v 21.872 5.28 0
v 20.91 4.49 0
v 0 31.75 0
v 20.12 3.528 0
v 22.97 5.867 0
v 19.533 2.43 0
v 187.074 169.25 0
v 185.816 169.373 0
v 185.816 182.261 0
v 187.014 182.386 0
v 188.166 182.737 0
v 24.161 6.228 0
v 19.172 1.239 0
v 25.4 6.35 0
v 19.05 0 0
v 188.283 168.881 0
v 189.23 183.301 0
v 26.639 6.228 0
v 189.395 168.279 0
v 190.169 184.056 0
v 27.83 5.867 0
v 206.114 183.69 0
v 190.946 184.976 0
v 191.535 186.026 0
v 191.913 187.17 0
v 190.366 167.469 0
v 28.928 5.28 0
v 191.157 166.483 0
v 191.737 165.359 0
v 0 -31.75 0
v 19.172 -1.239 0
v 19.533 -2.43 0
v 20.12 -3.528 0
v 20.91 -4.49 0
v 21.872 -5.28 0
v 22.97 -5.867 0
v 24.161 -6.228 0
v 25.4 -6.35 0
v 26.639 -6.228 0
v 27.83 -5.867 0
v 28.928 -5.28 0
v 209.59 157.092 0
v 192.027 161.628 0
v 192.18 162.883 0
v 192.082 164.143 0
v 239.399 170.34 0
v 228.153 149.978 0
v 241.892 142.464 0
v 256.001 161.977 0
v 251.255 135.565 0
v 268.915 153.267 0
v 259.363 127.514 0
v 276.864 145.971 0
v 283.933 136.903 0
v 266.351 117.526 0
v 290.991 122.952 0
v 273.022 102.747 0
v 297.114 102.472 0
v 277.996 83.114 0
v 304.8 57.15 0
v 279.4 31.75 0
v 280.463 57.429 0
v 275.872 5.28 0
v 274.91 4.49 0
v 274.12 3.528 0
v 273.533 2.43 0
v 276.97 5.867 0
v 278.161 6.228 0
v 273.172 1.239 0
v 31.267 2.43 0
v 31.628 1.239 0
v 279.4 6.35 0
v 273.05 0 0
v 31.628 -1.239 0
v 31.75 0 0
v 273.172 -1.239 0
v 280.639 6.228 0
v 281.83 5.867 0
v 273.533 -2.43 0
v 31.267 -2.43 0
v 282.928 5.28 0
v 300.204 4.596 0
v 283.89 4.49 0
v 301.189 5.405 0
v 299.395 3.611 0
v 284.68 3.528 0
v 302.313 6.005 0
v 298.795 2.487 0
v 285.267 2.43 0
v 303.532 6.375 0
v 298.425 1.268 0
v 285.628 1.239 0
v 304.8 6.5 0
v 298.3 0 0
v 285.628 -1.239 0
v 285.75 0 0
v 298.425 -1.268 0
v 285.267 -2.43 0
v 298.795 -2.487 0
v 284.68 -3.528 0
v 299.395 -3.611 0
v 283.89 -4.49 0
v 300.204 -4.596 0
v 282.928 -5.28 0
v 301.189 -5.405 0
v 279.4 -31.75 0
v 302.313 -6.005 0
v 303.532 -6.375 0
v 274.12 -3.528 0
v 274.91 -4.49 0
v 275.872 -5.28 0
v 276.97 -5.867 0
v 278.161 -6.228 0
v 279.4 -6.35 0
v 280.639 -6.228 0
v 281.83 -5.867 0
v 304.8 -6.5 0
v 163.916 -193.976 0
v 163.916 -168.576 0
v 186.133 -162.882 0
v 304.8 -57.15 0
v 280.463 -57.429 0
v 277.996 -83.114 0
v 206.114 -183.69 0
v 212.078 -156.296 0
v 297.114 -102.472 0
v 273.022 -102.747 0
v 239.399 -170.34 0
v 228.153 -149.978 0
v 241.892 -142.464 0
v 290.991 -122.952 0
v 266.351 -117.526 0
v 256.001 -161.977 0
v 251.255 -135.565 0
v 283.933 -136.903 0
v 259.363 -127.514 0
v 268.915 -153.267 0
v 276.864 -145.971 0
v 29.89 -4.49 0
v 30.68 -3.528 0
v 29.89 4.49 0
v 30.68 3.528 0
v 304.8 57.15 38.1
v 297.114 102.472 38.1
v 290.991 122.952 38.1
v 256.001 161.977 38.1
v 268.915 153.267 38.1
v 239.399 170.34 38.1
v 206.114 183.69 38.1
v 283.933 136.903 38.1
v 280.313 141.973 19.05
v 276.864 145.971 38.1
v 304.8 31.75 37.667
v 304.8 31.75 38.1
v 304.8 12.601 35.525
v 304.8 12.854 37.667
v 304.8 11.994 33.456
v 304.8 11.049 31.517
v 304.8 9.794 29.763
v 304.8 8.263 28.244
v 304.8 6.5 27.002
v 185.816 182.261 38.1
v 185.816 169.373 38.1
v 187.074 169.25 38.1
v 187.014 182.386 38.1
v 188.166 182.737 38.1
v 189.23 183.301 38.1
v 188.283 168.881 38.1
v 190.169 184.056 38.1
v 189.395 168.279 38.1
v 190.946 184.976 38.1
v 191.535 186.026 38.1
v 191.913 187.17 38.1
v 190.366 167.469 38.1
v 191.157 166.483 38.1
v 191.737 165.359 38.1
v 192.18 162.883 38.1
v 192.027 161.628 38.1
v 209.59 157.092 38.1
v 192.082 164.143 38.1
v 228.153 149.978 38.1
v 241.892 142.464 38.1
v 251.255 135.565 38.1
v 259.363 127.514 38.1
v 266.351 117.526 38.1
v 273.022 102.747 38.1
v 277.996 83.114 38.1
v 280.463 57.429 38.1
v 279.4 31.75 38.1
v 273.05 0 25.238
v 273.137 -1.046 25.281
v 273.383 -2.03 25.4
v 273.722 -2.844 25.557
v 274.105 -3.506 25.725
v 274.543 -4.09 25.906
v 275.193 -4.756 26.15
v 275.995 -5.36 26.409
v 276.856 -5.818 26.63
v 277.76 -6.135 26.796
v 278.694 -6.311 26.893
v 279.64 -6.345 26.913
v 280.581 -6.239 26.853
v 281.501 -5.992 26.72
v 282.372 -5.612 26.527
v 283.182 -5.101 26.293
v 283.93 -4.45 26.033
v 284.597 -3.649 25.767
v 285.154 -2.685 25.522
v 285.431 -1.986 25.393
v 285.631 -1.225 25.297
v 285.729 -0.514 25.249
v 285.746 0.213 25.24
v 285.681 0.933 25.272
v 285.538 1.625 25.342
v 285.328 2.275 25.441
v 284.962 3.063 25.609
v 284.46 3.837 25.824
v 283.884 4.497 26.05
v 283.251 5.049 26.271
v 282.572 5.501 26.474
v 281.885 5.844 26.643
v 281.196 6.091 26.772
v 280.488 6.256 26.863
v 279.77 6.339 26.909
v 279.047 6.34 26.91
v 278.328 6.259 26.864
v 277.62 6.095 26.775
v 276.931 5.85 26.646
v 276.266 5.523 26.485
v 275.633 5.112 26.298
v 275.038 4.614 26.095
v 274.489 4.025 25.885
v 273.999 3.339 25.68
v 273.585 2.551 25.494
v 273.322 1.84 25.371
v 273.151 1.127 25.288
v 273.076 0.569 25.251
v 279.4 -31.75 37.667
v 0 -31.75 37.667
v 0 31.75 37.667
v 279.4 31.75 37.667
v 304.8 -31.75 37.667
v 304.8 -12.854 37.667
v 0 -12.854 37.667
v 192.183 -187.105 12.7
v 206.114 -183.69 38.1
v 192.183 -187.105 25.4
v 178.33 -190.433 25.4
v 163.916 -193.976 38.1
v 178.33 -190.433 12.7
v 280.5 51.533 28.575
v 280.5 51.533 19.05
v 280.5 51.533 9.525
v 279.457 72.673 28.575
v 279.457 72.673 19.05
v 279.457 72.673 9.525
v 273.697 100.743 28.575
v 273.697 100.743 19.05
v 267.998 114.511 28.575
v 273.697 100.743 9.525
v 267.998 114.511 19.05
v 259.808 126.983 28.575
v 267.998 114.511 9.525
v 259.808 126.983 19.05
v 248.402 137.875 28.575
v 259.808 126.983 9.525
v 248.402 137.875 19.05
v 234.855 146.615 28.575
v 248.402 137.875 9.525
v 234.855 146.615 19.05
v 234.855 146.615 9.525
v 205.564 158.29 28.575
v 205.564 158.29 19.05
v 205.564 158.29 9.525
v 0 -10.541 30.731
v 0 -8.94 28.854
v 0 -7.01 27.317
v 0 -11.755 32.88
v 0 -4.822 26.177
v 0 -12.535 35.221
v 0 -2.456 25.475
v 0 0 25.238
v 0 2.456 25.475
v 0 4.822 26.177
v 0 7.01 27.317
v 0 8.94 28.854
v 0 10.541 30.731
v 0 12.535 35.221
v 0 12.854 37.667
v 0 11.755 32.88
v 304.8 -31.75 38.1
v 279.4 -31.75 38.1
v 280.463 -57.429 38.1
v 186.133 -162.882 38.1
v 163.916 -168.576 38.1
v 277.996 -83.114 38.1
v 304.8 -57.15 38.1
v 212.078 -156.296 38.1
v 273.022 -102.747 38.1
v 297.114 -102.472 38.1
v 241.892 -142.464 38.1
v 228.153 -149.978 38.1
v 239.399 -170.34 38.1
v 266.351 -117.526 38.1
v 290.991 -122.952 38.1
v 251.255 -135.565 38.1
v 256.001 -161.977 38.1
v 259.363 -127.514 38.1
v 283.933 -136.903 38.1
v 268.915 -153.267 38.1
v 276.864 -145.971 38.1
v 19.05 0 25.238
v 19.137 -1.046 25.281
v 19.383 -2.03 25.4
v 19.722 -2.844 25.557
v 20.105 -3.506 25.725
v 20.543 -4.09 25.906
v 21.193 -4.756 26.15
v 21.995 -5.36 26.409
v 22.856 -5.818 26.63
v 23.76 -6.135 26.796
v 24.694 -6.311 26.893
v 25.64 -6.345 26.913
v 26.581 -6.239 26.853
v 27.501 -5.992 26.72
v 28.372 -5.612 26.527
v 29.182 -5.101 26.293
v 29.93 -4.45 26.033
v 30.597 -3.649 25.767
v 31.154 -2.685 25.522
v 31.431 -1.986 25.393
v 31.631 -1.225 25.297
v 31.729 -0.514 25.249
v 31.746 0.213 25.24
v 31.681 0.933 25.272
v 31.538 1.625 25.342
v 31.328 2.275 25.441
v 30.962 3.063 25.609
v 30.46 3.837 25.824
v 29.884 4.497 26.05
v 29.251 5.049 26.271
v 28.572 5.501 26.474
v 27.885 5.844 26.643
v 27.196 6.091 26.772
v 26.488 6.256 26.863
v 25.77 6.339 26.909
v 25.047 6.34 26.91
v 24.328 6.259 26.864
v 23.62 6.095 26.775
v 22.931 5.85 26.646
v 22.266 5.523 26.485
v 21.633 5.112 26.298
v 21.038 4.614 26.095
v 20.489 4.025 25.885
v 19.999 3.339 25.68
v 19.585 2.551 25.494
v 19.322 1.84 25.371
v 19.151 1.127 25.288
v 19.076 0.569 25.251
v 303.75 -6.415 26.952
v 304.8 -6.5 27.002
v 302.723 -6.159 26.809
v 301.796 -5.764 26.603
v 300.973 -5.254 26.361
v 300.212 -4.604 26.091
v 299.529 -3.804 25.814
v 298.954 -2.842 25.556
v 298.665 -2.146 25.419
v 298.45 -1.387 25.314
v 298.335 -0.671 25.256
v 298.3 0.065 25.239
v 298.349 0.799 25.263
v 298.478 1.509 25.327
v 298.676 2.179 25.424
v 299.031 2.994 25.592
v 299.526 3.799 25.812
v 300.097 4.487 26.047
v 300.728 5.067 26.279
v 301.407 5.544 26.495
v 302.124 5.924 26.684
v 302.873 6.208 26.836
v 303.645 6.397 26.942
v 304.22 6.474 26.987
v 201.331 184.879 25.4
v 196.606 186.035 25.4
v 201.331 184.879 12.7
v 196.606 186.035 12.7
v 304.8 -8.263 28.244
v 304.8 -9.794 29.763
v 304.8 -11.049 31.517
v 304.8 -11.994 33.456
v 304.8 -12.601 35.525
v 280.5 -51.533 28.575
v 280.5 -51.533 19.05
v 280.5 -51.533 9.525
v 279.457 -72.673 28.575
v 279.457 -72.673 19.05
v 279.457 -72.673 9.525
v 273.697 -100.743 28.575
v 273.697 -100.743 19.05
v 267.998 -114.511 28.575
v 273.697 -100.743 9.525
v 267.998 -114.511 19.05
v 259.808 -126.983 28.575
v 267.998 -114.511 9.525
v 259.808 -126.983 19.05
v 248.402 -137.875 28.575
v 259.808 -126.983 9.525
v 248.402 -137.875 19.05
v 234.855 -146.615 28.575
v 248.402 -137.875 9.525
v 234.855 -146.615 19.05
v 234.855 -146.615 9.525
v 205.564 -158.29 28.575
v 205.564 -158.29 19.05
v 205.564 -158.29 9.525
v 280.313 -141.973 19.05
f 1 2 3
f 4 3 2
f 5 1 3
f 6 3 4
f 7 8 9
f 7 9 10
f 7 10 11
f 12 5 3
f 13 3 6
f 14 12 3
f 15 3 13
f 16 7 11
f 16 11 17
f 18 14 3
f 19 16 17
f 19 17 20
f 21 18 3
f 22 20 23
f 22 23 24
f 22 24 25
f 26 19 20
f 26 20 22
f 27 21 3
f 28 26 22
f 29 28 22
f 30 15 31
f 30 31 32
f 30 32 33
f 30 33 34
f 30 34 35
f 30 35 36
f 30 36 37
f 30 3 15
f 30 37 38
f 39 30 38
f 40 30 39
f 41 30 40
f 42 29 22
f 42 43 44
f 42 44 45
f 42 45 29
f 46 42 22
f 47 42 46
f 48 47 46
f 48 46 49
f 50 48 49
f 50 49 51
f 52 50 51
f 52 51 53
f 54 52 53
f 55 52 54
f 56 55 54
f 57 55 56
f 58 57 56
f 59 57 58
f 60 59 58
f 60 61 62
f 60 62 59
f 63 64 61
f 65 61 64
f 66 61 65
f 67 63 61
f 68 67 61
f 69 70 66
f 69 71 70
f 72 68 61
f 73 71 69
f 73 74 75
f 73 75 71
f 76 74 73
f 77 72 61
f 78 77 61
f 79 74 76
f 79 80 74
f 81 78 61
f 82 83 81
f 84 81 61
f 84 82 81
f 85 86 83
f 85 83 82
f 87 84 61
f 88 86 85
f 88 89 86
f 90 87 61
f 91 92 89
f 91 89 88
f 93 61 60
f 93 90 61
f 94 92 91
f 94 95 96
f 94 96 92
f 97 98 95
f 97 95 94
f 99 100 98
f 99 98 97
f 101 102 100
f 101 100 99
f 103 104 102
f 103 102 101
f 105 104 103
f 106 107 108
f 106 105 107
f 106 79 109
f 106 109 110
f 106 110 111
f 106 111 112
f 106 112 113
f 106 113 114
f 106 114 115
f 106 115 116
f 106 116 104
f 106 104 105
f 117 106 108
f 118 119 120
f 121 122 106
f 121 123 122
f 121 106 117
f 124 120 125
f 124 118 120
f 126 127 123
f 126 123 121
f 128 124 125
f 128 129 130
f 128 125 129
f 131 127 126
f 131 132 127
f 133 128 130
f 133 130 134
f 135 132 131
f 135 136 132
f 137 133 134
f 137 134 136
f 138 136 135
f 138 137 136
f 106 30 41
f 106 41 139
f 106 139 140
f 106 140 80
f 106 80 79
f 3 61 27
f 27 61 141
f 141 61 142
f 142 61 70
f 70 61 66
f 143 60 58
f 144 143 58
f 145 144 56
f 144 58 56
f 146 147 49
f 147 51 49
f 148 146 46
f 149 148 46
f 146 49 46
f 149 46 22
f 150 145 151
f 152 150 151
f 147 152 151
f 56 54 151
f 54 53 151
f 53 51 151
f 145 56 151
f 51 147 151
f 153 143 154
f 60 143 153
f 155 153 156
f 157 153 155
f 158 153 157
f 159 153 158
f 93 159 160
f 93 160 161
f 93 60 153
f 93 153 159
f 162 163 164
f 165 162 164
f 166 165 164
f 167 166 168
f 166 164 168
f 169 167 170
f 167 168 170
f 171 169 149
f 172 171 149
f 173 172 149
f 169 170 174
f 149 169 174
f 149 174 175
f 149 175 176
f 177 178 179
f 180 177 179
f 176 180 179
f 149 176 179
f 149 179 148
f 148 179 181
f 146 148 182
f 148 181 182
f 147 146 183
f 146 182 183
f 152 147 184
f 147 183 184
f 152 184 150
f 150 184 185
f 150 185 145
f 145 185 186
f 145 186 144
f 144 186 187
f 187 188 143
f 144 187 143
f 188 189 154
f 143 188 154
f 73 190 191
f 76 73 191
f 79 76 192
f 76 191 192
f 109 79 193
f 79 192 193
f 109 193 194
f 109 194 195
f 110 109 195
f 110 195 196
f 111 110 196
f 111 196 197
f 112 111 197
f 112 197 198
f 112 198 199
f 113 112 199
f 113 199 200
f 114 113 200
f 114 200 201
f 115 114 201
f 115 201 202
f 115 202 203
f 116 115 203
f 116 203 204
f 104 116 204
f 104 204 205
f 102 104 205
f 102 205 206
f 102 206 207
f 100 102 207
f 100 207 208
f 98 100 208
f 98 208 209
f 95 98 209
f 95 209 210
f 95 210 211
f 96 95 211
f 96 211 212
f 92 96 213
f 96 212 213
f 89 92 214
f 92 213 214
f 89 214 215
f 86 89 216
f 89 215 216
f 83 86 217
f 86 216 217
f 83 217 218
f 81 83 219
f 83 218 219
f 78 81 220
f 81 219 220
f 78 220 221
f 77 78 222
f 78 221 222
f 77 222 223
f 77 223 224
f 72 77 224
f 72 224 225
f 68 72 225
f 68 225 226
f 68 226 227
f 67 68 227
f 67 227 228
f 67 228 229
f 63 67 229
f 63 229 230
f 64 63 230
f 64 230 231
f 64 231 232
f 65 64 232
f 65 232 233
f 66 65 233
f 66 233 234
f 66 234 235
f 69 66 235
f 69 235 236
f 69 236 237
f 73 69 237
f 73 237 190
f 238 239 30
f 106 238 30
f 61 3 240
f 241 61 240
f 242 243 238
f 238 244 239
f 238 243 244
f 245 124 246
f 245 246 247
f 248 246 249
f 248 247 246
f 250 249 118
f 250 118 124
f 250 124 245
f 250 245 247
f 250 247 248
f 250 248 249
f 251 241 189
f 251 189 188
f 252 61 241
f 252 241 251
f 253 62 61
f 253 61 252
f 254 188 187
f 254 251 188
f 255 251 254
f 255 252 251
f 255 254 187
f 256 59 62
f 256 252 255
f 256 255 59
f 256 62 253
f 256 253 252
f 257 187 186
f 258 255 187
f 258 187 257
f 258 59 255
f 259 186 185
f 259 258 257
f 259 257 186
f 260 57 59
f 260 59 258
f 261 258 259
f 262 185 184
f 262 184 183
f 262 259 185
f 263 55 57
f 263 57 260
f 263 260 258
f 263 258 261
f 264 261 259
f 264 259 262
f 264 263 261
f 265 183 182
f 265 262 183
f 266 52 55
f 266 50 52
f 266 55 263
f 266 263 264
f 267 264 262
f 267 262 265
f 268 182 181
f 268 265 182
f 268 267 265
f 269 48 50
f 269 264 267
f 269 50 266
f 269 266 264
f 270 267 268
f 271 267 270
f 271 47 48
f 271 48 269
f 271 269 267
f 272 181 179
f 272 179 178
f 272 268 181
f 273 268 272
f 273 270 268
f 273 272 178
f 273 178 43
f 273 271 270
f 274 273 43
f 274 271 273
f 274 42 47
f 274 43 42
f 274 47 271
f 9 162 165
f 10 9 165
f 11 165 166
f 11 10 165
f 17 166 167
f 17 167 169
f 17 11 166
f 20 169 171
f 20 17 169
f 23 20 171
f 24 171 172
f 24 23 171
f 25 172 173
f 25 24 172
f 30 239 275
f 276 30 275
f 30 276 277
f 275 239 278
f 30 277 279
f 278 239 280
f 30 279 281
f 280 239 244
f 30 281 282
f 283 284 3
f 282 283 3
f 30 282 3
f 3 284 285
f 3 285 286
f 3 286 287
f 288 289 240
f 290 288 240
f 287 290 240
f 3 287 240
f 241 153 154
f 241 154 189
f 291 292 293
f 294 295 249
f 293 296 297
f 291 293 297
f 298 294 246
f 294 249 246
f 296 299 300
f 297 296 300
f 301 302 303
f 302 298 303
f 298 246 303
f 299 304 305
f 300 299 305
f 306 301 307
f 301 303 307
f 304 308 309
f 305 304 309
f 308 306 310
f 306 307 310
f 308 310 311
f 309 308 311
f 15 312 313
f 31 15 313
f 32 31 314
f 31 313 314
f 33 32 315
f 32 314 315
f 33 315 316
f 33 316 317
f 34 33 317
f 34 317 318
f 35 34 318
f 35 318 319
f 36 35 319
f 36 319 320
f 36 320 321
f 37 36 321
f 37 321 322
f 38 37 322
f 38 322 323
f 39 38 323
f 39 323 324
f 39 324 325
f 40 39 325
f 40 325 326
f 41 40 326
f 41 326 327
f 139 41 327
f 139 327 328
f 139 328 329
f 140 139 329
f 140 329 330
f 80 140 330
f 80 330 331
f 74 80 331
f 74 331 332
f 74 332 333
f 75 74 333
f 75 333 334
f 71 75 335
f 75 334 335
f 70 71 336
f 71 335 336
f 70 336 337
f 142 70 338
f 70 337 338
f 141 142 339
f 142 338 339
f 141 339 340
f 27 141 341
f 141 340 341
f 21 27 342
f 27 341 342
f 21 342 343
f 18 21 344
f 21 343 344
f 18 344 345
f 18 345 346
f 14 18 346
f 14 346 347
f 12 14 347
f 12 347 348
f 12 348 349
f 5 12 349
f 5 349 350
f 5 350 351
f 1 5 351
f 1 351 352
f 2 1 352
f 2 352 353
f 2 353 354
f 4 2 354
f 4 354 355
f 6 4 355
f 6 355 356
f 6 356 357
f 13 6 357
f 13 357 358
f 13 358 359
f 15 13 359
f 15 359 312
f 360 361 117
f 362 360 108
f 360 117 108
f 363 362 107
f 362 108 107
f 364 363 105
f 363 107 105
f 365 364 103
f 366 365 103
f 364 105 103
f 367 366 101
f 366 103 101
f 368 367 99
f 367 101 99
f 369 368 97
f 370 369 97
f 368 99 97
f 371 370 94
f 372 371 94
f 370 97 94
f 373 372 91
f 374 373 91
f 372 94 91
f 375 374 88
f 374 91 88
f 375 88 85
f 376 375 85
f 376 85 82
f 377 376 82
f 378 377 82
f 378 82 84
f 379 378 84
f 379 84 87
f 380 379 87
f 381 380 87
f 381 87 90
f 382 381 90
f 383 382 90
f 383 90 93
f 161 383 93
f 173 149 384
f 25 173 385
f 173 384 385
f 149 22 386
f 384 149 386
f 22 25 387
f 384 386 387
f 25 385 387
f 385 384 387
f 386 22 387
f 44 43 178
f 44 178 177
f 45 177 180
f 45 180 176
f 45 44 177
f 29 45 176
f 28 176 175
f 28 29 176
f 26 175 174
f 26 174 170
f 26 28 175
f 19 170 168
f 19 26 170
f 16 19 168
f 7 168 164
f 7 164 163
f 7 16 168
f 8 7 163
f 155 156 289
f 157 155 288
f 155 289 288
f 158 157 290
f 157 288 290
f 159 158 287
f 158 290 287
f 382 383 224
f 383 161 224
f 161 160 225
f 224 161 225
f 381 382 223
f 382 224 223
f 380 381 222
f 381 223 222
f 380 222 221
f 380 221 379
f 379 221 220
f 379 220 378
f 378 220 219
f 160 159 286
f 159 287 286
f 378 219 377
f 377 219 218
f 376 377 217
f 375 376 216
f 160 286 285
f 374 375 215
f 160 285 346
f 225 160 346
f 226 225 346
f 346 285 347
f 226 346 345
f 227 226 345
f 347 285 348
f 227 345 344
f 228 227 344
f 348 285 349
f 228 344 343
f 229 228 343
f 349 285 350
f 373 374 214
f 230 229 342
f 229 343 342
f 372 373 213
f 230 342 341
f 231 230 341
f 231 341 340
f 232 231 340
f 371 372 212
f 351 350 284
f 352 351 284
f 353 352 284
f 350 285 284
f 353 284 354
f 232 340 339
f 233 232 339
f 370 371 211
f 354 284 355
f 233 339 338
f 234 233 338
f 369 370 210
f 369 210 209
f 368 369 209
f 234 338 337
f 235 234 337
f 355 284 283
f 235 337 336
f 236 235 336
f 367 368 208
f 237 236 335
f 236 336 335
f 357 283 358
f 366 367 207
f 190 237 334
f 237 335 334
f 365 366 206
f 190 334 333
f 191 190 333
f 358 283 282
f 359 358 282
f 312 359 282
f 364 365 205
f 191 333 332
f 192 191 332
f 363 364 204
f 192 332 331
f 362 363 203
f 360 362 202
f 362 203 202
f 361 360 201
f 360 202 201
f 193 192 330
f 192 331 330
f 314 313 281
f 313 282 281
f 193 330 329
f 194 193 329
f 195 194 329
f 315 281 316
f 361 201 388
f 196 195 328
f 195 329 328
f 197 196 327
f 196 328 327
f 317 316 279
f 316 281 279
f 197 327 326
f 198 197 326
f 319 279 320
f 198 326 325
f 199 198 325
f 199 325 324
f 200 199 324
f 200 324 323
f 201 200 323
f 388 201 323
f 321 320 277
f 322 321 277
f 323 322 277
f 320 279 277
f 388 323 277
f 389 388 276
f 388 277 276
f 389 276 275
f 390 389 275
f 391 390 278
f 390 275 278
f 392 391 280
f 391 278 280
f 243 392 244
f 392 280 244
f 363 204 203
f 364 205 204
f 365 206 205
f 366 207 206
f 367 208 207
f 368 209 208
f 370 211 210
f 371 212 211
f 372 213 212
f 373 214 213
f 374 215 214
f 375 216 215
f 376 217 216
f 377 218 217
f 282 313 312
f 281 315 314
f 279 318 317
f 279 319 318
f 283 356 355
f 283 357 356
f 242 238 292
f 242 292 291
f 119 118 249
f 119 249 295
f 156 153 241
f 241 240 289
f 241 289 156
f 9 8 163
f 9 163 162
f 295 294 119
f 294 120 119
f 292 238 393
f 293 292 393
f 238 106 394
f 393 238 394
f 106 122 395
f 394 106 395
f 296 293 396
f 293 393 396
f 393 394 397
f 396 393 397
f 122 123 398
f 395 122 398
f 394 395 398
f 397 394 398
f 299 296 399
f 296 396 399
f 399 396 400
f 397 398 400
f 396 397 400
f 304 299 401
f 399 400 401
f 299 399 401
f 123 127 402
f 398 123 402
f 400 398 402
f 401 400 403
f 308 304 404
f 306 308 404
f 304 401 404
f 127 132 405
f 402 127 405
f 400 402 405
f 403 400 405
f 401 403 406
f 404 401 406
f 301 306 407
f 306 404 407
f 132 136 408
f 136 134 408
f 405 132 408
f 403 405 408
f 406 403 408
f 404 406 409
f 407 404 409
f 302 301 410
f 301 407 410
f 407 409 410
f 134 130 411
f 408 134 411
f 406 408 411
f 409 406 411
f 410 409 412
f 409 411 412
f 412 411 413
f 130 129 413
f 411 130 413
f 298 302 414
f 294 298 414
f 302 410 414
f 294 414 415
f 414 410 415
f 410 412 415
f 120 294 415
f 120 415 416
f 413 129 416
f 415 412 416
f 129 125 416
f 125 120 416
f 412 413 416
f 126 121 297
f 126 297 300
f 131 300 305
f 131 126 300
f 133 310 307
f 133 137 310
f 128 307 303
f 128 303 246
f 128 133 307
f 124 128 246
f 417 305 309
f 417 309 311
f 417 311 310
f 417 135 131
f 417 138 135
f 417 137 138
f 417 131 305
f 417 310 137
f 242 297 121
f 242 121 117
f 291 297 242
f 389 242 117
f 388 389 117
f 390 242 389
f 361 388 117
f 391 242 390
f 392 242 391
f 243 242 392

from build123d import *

# Parameters (mm, degrees)
F1_DEPTH = 304.8
F3_DEPTH = 37.6682579939
F5_D     = 12.7
F7_DEPTH = 38.1


with BuildPart() as f1:
    # F0 (on Right) → F1 (new body)
    with BuildSketch(Plane.YZ):
        with BuildLine():
            Line((-31.75, 37.6672579939), (-31.75, 0))
            Line((-31.75, 0), (31.75, 0))
            Line((31.75, 0), (31.75, 37.6672579939))
            Line((31.75, 37.6672579939), (12.8542501479, 37.6672579939))
            ThreePointArc((12.8542501479, 37.6672579939), (0, 25.2384677231), (-12.8542501479, 37.6672579939))
            Line((-12.8542501479, 37.6672579939), (-31.75, 37.6672579939))
        make_face()
    extrude(amount=F1_DEPTH)

    # F2 (on face) → F3 (cut, through all)
    with BuildSketch(Plane(origin=(0, 0, 0), x_dir=(1, 0, 0), z_dir=(0, 0, -1))):
        with BuildLine():
            Line((304.8, -6.5), (304.8, 6.5))
            ThreePointArc((304.8, 6.5), (298.3, 0), (304.8, -6.5))
        make_face()
    extrude(amount=-F3_DEPTH, mode=Mode.SUBTRACT)

    # F5 (through all)
    with Locations(Plane(origin=(0, 0, 0), x_dir=(1, 0, 0), z_dir=(0, 0, -1))):
        with Locations((25.4, 0), (279.4, 0)):
            Hole(F5_D / 2)

    # F6 (on face) → F7 (join)
    with BuildSketch(Plane(origin=(0, 0, 0), x_dir=(1, 0, 0), z_dir=(0, 0, -1))):
        with BuildLine():
            Line((304.8, -57.15), (304.8, -31.75))
            Line((304.8, -31.75), (279.4, -31.75))
            add(Edge.make_bspline(
                [(279.4, -31.75), (280.6196464062, -44.9519572545), (281.6562352616, -72.7591128188), (267.4659060578, -133.5460316096), (219.311230836, -155.2848931595), (196.3723528224, -160.6784621447), (192.0268553365, -161.6276637507)],
                knots=[0, 0, 0, 0, 0.2247705993, 0.4917972226, 0.7698647046, 0.837979119, 0.837979119, 0.837979119, 0.837979119], degree=3))
            ThreePointArc((192.0268553365, -161.6276637507), (190.7858628977, -166.9955827691), (185.8158122141, -169.3732314025))
            Line((185.8158122141, -169.3732314025), (185.8158122141, -182.2608020978))
            ThreePointArc((185.8158122141, -182.2608020978), (189.717508907, -183.6558096923), (191.912954164, -187.1699672577))
            add(Edge.make_bspline(
                [(206.1138840691, -183.6896836758), (201.2935156589, -184.8995347049), (196.5975482437, -186.0418094447), (191.912954164, -187.1699672577)],
                knots=[0, 0, 0, 0, 14.7614757351, 14.7614757351, 14.7614757351, 14.7614757351], degree=3))
            add(Edge.make_bspline(
                [(304.8, -57.15), (299.6183479782, -88.5960237562), (294.5771500768, -152.4240335574), (233.688003705, -172.914172303), (206.1138840691, -183.6896836758)],
                knots=[0, 0, 0, 0, 0.5045633421, 1, 1, 1, 1], degree=3))
        make_face()
        with BuildLine():
            Line((279.4, 31.75), (304.8, 31.75))
            Line((304.8, 31.75), (304.8, 57.15))
            add(Edge.make_bspline(
                [(304.8, 57.15), (299.6183479782, 88.5960237562), (294.5771500768, 152.4240335574), (233.688003705, 172.914172303), (206.1138840691, 183.6896836758)],
                knots=[0, 0, 0, 0, 0.5045633421, 1, 1, 1, 1], degree=3))
            add(Edge.make_bspline(
                [(206.1138840691, 183.6896836758), (191.930532214, 187.2495242062), (178.8241938518, 190.2243165594), (163.9156103992, 193.9758807421)],
                knots=[0, 0, 0, 0, 43.433859497, 43.433859497, 43.433859497, 43.433859497], degree=3))
            Line((163.9156103992, 193.9758807421), (163.9156103992, 168.5758807421))
            add(Edge.make_bspline(
                [(279.4, 31.75), (280.6196464062, 44.9519572545), (281.6562352616, 72.7591128188), (267.4659060578, 133.5460316096), (206.5878868967, 161.0286970804), (175.8306996904, 164.2202895611), (163.9156103992, 168.5758807421)],
                knots=[0, 0, 0, 0, 0.2247705993, 0.4917972226, 0.7698647046, 1, 1, 1, 1], degree=3))
        make_face()
    extrude(amount=-F7_DEPTH)


solid = f1.part
